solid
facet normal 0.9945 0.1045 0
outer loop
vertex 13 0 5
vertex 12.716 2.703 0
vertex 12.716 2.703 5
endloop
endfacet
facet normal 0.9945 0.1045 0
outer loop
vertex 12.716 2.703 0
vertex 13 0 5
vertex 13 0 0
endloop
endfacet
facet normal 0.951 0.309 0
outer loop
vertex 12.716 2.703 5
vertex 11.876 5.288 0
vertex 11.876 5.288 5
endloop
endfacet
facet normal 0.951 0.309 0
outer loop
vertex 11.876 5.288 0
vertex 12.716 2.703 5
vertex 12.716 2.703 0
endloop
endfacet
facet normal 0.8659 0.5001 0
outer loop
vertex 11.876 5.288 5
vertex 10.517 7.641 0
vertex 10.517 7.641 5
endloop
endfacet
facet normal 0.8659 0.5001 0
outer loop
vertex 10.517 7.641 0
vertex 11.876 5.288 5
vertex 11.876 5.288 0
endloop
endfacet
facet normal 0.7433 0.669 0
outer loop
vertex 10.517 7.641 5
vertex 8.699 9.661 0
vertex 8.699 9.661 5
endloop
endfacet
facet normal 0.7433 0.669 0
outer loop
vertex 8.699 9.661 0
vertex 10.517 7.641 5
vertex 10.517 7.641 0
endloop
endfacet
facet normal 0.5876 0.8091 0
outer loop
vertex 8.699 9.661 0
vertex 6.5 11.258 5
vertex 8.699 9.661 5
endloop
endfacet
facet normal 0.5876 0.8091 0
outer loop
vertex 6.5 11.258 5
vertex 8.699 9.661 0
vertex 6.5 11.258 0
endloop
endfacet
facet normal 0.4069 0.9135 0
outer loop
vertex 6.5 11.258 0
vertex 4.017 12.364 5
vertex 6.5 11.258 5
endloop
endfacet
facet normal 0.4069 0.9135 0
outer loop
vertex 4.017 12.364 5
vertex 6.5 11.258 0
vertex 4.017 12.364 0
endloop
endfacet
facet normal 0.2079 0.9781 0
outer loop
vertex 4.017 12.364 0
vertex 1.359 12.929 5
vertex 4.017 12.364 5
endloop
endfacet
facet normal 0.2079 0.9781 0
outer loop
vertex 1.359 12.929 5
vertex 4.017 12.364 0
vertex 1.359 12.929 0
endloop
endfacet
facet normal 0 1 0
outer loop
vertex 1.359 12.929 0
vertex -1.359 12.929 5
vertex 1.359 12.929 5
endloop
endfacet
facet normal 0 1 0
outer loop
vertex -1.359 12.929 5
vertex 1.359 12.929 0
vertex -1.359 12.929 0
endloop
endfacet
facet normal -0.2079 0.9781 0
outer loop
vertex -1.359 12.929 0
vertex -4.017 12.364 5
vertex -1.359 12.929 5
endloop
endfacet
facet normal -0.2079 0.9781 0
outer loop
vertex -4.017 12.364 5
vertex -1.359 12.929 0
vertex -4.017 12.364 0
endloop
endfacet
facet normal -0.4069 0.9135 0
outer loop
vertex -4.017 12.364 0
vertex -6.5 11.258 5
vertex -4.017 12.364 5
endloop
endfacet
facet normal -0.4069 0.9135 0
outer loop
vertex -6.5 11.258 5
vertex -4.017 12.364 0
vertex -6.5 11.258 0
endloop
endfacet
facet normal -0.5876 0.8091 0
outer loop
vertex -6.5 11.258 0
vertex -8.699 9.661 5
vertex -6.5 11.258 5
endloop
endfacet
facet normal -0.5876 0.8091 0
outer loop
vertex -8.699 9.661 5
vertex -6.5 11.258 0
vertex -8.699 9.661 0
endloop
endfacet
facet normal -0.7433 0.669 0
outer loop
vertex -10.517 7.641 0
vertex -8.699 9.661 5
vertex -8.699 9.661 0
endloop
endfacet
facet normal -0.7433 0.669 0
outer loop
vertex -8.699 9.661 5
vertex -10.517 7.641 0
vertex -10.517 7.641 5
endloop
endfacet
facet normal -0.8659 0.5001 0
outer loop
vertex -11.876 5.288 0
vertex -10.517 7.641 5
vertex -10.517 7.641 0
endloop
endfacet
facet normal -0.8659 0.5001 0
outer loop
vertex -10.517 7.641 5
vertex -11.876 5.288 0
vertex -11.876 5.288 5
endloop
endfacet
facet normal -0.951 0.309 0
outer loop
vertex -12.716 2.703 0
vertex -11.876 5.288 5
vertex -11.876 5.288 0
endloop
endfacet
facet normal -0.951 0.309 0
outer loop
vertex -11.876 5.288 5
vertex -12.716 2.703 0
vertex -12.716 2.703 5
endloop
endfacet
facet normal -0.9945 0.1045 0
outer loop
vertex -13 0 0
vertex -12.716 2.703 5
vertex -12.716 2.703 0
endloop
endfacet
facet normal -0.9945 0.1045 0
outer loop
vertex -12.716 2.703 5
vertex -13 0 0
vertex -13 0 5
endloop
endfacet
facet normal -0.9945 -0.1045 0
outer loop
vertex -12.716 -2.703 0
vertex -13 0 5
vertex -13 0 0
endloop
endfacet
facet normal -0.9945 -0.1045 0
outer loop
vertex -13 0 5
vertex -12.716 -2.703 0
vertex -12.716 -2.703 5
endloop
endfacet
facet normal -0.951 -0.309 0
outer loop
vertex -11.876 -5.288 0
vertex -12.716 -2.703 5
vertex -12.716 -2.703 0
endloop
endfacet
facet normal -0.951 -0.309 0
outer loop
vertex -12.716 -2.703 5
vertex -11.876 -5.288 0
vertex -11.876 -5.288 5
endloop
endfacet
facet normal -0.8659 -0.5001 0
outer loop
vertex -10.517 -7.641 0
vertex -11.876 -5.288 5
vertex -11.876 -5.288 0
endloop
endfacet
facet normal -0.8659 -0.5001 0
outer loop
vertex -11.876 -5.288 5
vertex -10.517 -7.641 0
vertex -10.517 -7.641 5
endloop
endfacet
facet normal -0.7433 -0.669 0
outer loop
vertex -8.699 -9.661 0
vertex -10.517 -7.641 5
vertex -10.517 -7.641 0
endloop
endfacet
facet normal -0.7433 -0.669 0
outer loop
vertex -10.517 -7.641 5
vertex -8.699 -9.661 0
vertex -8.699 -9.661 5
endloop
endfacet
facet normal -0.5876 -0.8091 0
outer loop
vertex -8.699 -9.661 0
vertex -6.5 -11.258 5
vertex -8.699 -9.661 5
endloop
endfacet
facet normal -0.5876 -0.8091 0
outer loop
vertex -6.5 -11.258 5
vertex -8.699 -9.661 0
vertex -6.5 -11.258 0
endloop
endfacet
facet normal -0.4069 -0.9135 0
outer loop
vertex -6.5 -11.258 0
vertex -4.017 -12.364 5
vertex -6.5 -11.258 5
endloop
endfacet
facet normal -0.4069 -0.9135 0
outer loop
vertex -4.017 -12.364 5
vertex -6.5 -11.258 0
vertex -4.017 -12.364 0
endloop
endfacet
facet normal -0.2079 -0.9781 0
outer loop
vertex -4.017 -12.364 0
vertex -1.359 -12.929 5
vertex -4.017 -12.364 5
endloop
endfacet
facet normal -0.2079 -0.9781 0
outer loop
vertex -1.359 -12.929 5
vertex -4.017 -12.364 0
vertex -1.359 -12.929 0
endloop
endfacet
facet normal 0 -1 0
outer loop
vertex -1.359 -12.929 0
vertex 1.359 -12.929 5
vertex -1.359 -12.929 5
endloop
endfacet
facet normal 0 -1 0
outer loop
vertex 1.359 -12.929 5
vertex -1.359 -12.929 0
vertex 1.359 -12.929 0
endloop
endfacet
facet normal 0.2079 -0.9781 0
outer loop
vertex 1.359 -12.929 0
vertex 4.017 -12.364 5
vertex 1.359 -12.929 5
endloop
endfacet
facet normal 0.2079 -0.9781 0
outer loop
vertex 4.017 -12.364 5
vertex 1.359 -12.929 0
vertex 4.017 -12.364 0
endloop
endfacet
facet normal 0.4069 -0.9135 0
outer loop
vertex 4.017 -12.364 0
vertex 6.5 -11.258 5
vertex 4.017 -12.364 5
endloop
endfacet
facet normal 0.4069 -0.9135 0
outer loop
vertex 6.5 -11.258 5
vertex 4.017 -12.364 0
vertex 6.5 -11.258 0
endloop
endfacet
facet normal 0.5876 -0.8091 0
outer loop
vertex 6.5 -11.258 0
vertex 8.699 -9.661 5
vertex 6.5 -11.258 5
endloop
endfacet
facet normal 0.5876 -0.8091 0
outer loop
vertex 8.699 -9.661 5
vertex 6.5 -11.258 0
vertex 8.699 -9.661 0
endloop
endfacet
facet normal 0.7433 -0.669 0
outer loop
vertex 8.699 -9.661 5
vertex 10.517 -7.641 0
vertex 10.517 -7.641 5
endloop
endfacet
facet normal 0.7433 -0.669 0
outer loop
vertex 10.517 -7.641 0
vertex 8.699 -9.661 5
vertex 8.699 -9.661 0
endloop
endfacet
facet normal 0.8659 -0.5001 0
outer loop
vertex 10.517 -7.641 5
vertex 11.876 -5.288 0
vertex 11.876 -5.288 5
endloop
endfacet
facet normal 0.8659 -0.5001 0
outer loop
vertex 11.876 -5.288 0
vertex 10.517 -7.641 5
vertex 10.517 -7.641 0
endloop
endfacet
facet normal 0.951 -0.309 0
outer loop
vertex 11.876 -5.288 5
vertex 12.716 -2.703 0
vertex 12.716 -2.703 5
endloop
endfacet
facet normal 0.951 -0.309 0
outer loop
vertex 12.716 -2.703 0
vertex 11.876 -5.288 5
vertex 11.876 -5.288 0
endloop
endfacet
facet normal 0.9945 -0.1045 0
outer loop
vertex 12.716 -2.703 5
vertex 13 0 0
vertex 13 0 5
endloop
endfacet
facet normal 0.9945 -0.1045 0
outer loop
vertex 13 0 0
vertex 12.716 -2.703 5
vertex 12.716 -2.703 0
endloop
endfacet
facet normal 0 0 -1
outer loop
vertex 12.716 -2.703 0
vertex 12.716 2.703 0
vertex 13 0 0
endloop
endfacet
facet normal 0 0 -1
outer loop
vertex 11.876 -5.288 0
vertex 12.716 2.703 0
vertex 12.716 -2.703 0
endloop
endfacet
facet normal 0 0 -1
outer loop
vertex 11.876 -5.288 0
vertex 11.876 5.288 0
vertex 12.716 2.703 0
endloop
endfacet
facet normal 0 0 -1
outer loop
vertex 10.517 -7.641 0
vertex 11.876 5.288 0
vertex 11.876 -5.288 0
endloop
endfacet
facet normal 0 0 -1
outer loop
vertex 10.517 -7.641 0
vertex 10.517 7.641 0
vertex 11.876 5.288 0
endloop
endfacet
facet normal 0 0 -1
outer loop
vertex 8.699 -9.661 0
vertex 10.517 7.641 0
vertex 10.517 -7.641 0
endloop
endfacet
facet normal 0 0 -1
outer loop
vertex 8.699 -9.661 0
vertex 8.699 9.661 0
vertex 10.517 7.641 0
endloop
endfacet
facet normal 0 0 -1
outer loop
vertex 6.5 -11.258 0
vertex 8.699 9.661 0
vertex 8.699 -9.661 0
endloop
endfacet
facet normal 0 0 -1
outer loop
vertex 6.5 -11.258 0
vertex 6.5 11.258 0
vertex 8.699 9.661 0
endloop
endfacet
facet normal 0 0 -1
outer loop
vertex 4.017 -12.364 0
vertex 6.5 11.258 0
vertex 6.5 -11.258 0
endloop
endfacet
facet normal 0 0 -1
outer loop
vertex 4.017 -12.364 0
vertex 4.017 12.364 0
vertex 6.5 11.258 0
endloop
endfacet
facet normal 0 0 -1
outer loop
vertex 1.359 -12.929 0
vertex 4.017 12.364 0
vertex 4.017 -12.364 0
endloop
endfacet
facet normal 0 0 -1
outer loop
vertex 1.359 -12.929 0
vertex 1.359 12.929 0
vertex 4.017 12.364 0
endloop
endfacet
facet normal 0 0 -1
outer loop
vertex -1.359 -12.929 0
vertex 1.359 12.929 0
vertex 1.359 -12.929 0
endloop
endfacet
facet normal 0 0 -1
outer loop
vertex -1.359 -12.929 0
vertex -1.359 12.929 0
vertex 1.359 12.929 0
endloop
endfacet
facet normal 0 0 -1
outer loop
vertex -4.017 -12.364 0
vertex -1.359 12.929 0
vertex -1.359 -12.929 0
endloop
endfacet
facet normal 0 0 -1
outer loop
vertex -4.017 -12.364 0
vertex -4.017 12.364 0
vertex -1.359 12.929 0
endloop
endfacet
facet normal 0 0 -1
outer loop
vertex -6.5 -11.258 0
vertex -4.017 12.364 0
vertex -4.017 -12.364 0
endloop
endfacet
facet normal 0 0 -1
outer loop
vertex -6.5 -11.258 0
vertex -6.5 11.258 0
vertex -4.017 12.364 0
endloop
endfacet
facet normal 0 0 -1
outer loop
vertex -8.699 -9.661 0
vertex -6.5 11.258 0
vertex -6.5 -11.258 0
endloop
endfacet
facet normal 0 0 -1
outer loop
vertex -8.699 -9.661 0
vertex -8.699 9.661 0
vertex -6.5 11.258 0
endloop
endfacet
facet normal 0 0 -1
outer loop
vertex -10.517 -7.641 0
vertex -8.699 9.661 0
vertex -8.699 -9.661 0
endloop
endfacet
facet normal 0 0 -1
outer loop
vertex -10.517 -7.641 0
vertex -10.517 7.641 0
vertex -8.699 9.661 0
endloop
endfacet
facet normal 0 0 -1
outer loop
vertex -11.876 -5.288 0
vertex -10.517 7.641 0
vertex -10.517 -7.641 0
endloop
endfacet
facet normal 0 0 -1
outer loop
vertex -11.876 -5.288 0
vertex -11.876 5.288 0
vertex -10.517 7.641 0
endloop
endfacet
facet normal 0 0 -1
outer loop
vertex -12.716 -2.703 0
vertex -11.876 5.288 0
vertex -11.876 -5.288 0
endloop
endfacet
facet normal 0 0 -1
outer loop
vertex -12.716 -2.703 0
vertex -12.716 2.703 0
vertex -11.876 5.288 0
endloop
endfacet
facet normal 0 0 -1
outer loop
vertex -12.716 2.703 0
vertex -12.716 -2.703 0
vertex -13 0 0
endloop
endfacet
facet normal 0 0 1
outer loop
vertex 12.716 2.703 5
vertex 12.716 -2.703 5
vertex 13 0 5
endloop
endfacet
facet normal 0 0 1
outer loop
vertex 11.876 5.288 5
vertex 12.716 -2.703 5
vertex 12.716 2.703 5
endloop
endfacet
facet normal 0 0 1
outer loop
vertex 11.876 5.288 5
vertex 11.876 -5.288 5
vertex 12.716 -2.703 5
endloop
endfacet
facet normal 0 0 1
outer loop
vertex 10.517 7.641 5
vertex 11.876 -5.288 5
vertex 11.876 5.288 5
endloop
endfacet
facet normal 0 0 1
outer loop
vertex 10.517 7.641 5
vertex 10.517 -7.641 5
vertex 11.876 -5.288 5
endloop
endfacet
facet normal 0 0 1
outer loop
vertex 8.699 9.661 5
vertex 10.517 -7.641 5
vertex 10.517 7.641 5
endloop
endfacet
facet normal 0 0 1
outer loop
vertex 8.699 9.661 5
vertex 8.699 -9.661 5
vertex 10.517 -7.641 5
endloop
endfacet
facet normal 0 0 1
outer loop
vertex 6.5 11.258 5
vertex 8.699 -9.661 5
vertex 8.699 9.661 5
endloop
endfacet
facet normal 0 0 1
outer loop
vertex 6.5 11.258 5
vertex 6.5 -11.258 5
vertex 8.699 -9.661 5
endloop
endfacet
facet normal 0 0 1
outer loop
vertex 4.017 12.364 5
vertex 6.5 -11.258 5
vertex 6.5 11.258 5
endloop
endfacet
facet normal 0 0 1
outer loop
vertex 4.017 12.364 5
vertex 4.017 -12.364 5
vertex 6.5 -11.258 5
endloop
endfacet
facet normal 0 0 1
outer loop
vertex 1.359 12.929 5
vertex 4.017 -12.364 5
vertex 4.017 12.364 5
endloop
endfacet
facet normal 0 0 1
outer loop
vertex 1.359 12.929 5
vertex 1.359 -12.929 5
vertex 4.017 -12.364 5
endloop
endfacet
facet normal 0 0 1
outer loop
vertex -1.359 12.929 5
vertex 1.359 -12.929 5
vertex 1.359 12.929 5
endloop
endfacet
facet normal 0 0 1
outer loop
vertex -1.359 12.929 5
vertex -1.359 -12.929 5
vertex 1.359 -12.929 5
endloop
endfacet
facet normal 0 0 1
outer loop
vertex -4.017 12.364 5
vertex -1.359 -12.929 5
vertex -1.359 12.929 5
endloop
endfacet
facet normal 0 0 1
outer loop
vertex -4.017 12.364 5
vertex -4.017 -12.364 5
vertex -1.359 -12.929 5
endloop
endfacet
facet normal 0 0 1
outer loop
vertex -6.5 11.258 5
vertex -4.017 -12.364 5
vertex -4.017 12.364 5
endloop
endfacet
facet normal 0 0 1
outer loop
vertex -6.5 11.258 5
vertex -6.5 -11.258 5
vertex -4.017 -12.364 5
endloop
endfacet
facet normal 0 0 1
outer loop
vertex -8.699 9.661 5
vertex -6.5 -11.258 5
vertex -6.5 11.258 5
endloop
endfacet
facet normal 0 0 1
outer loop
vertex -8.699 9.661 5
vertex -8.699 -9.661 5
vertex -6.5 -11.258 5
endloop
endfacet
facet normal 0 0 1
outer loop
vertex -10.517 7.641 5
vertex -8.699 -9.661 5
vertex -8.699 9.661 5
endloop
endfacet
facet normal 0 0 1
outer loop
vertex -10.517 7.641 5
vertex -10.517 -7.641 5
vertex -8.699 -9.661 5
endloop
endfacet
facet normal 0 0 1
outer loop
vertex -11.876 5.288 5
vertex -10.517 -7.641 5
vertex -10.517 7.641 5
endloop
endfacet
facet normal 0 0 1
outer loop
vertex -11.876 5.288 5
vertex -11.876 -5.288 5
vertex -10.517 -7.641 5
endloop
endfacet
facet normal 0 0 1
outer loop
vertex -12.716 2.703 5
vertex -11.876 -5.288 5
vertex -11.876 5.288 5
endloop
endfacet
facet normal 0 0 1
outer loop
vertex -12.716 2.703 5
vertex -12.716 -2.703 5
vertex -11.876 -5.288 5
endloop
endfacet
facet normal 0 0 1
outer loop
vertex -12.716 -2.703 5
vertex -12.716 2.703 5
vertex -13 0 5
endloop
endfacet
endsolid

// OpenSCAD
// Generated by SolidPython 1.0.1 on 2020-07-29 00:46:44


cylinder(h = 5, r1 = 13, r2 = 13);
/***********************************************
*********      SolidPython code:      **********
************************************************
 
# import packages: SolidPython
from solid import *
from solid.utils import *
from itertools import chain, combinations, permutations


class Resize:

    def __init__(self, scad_file):
        self.scad_file = scad_file
        #self.scad_file = import_scad(scad_file)
        # cone/cylinder param:
        self.r1 = 0
        self.r2 = 0
        self.h = 0
        # rectangular prism param:
        self.w = 0
        self.l = 0
        # ellipse param:
        self.r = 0

    # import OpenScad code (file name corresponds to shape)


    # classify shape + parameters
    def assign(self, param1, param2, param3):
        if self.scad_file == 'cone.scad':
            self.r1 = param1
            self.r2 = param2
            self.h = param3
        elif self.scad_file == 'cylinder.scad':
            self.r1 = param1
            self.r2 = param2
            self.h = param3
        elif self.scad_file == 'rectangularPrism.scad':
            self.h = param1
            self.l = param2
            self.w = param3
        else:
            self.r = param1
            self.h = param2

    # resize parameters
    def iterate(self):
        x = range(3, 20, 2)
        i = 1
        if self.scad_file == 'cone.scad':
            tempList = list(permutations(x, 2))
            for temp in tempList:
                param1 = temp[0]
                param2 = temp[1]
                filepath = 'produced_scad_files/' + 'cone' + str(param1) + '_' + str(param2) + '_' + '.scad'
                scad_render_to_file(cylinder(h=param1, r1=param2, r2=0), filepath)

        elif self.scad_file == 'cylinder.scad':
            tempList = list(permutations(x, 3))
            for temp in tempList:
                param1 = temp[0]
                param2 = temp[1]
                filepath = 'produced_scad_files/' + 'cylinder' + str(param1) + '_' + str(param2) + '_' + '.scad'
                scad_render_to_file(cylinder(h=param1, r1=param2, r2=param2), filepath)

        elif self.scad_file == 'rectangularPrism.scad':
            tempList = list(permutations(x, 3))
            for temp in tempList:
                param1 = temp[0]
                param2 = temp[1]
                param3 = temp[2]
                filepath = 'produced_scad_files/' + 'rectangularPrism' + str(param1) + '_' + str(param2) + '_' + str(
                    param3) + '.scad'
                scad_render_to_file(cube(size=(param1, param2, param3)), filepath)

        elif self.scad_file == 'ellipse.scad':
            tempList = list(permutations(x, 4))
            for temp in tempList:
                param1 = temp[0]
                param2 = temp[1]
                param3 = temp[2]
                param4 = temp[3]
                filepath = 'produced_scad_files/' + 'ellipse' + str(param1) + '_' + str(param2) + '_' + str(param3) + '_' + str(param4) + '.scad'
                scad_render_to_file(scale([param1, param2, param3])(sphere(r=param4)), filepath)

    def render_to_scadfile(self):
        scad_render_to_file(scad, 'example.scad') 
 
************************************************/
